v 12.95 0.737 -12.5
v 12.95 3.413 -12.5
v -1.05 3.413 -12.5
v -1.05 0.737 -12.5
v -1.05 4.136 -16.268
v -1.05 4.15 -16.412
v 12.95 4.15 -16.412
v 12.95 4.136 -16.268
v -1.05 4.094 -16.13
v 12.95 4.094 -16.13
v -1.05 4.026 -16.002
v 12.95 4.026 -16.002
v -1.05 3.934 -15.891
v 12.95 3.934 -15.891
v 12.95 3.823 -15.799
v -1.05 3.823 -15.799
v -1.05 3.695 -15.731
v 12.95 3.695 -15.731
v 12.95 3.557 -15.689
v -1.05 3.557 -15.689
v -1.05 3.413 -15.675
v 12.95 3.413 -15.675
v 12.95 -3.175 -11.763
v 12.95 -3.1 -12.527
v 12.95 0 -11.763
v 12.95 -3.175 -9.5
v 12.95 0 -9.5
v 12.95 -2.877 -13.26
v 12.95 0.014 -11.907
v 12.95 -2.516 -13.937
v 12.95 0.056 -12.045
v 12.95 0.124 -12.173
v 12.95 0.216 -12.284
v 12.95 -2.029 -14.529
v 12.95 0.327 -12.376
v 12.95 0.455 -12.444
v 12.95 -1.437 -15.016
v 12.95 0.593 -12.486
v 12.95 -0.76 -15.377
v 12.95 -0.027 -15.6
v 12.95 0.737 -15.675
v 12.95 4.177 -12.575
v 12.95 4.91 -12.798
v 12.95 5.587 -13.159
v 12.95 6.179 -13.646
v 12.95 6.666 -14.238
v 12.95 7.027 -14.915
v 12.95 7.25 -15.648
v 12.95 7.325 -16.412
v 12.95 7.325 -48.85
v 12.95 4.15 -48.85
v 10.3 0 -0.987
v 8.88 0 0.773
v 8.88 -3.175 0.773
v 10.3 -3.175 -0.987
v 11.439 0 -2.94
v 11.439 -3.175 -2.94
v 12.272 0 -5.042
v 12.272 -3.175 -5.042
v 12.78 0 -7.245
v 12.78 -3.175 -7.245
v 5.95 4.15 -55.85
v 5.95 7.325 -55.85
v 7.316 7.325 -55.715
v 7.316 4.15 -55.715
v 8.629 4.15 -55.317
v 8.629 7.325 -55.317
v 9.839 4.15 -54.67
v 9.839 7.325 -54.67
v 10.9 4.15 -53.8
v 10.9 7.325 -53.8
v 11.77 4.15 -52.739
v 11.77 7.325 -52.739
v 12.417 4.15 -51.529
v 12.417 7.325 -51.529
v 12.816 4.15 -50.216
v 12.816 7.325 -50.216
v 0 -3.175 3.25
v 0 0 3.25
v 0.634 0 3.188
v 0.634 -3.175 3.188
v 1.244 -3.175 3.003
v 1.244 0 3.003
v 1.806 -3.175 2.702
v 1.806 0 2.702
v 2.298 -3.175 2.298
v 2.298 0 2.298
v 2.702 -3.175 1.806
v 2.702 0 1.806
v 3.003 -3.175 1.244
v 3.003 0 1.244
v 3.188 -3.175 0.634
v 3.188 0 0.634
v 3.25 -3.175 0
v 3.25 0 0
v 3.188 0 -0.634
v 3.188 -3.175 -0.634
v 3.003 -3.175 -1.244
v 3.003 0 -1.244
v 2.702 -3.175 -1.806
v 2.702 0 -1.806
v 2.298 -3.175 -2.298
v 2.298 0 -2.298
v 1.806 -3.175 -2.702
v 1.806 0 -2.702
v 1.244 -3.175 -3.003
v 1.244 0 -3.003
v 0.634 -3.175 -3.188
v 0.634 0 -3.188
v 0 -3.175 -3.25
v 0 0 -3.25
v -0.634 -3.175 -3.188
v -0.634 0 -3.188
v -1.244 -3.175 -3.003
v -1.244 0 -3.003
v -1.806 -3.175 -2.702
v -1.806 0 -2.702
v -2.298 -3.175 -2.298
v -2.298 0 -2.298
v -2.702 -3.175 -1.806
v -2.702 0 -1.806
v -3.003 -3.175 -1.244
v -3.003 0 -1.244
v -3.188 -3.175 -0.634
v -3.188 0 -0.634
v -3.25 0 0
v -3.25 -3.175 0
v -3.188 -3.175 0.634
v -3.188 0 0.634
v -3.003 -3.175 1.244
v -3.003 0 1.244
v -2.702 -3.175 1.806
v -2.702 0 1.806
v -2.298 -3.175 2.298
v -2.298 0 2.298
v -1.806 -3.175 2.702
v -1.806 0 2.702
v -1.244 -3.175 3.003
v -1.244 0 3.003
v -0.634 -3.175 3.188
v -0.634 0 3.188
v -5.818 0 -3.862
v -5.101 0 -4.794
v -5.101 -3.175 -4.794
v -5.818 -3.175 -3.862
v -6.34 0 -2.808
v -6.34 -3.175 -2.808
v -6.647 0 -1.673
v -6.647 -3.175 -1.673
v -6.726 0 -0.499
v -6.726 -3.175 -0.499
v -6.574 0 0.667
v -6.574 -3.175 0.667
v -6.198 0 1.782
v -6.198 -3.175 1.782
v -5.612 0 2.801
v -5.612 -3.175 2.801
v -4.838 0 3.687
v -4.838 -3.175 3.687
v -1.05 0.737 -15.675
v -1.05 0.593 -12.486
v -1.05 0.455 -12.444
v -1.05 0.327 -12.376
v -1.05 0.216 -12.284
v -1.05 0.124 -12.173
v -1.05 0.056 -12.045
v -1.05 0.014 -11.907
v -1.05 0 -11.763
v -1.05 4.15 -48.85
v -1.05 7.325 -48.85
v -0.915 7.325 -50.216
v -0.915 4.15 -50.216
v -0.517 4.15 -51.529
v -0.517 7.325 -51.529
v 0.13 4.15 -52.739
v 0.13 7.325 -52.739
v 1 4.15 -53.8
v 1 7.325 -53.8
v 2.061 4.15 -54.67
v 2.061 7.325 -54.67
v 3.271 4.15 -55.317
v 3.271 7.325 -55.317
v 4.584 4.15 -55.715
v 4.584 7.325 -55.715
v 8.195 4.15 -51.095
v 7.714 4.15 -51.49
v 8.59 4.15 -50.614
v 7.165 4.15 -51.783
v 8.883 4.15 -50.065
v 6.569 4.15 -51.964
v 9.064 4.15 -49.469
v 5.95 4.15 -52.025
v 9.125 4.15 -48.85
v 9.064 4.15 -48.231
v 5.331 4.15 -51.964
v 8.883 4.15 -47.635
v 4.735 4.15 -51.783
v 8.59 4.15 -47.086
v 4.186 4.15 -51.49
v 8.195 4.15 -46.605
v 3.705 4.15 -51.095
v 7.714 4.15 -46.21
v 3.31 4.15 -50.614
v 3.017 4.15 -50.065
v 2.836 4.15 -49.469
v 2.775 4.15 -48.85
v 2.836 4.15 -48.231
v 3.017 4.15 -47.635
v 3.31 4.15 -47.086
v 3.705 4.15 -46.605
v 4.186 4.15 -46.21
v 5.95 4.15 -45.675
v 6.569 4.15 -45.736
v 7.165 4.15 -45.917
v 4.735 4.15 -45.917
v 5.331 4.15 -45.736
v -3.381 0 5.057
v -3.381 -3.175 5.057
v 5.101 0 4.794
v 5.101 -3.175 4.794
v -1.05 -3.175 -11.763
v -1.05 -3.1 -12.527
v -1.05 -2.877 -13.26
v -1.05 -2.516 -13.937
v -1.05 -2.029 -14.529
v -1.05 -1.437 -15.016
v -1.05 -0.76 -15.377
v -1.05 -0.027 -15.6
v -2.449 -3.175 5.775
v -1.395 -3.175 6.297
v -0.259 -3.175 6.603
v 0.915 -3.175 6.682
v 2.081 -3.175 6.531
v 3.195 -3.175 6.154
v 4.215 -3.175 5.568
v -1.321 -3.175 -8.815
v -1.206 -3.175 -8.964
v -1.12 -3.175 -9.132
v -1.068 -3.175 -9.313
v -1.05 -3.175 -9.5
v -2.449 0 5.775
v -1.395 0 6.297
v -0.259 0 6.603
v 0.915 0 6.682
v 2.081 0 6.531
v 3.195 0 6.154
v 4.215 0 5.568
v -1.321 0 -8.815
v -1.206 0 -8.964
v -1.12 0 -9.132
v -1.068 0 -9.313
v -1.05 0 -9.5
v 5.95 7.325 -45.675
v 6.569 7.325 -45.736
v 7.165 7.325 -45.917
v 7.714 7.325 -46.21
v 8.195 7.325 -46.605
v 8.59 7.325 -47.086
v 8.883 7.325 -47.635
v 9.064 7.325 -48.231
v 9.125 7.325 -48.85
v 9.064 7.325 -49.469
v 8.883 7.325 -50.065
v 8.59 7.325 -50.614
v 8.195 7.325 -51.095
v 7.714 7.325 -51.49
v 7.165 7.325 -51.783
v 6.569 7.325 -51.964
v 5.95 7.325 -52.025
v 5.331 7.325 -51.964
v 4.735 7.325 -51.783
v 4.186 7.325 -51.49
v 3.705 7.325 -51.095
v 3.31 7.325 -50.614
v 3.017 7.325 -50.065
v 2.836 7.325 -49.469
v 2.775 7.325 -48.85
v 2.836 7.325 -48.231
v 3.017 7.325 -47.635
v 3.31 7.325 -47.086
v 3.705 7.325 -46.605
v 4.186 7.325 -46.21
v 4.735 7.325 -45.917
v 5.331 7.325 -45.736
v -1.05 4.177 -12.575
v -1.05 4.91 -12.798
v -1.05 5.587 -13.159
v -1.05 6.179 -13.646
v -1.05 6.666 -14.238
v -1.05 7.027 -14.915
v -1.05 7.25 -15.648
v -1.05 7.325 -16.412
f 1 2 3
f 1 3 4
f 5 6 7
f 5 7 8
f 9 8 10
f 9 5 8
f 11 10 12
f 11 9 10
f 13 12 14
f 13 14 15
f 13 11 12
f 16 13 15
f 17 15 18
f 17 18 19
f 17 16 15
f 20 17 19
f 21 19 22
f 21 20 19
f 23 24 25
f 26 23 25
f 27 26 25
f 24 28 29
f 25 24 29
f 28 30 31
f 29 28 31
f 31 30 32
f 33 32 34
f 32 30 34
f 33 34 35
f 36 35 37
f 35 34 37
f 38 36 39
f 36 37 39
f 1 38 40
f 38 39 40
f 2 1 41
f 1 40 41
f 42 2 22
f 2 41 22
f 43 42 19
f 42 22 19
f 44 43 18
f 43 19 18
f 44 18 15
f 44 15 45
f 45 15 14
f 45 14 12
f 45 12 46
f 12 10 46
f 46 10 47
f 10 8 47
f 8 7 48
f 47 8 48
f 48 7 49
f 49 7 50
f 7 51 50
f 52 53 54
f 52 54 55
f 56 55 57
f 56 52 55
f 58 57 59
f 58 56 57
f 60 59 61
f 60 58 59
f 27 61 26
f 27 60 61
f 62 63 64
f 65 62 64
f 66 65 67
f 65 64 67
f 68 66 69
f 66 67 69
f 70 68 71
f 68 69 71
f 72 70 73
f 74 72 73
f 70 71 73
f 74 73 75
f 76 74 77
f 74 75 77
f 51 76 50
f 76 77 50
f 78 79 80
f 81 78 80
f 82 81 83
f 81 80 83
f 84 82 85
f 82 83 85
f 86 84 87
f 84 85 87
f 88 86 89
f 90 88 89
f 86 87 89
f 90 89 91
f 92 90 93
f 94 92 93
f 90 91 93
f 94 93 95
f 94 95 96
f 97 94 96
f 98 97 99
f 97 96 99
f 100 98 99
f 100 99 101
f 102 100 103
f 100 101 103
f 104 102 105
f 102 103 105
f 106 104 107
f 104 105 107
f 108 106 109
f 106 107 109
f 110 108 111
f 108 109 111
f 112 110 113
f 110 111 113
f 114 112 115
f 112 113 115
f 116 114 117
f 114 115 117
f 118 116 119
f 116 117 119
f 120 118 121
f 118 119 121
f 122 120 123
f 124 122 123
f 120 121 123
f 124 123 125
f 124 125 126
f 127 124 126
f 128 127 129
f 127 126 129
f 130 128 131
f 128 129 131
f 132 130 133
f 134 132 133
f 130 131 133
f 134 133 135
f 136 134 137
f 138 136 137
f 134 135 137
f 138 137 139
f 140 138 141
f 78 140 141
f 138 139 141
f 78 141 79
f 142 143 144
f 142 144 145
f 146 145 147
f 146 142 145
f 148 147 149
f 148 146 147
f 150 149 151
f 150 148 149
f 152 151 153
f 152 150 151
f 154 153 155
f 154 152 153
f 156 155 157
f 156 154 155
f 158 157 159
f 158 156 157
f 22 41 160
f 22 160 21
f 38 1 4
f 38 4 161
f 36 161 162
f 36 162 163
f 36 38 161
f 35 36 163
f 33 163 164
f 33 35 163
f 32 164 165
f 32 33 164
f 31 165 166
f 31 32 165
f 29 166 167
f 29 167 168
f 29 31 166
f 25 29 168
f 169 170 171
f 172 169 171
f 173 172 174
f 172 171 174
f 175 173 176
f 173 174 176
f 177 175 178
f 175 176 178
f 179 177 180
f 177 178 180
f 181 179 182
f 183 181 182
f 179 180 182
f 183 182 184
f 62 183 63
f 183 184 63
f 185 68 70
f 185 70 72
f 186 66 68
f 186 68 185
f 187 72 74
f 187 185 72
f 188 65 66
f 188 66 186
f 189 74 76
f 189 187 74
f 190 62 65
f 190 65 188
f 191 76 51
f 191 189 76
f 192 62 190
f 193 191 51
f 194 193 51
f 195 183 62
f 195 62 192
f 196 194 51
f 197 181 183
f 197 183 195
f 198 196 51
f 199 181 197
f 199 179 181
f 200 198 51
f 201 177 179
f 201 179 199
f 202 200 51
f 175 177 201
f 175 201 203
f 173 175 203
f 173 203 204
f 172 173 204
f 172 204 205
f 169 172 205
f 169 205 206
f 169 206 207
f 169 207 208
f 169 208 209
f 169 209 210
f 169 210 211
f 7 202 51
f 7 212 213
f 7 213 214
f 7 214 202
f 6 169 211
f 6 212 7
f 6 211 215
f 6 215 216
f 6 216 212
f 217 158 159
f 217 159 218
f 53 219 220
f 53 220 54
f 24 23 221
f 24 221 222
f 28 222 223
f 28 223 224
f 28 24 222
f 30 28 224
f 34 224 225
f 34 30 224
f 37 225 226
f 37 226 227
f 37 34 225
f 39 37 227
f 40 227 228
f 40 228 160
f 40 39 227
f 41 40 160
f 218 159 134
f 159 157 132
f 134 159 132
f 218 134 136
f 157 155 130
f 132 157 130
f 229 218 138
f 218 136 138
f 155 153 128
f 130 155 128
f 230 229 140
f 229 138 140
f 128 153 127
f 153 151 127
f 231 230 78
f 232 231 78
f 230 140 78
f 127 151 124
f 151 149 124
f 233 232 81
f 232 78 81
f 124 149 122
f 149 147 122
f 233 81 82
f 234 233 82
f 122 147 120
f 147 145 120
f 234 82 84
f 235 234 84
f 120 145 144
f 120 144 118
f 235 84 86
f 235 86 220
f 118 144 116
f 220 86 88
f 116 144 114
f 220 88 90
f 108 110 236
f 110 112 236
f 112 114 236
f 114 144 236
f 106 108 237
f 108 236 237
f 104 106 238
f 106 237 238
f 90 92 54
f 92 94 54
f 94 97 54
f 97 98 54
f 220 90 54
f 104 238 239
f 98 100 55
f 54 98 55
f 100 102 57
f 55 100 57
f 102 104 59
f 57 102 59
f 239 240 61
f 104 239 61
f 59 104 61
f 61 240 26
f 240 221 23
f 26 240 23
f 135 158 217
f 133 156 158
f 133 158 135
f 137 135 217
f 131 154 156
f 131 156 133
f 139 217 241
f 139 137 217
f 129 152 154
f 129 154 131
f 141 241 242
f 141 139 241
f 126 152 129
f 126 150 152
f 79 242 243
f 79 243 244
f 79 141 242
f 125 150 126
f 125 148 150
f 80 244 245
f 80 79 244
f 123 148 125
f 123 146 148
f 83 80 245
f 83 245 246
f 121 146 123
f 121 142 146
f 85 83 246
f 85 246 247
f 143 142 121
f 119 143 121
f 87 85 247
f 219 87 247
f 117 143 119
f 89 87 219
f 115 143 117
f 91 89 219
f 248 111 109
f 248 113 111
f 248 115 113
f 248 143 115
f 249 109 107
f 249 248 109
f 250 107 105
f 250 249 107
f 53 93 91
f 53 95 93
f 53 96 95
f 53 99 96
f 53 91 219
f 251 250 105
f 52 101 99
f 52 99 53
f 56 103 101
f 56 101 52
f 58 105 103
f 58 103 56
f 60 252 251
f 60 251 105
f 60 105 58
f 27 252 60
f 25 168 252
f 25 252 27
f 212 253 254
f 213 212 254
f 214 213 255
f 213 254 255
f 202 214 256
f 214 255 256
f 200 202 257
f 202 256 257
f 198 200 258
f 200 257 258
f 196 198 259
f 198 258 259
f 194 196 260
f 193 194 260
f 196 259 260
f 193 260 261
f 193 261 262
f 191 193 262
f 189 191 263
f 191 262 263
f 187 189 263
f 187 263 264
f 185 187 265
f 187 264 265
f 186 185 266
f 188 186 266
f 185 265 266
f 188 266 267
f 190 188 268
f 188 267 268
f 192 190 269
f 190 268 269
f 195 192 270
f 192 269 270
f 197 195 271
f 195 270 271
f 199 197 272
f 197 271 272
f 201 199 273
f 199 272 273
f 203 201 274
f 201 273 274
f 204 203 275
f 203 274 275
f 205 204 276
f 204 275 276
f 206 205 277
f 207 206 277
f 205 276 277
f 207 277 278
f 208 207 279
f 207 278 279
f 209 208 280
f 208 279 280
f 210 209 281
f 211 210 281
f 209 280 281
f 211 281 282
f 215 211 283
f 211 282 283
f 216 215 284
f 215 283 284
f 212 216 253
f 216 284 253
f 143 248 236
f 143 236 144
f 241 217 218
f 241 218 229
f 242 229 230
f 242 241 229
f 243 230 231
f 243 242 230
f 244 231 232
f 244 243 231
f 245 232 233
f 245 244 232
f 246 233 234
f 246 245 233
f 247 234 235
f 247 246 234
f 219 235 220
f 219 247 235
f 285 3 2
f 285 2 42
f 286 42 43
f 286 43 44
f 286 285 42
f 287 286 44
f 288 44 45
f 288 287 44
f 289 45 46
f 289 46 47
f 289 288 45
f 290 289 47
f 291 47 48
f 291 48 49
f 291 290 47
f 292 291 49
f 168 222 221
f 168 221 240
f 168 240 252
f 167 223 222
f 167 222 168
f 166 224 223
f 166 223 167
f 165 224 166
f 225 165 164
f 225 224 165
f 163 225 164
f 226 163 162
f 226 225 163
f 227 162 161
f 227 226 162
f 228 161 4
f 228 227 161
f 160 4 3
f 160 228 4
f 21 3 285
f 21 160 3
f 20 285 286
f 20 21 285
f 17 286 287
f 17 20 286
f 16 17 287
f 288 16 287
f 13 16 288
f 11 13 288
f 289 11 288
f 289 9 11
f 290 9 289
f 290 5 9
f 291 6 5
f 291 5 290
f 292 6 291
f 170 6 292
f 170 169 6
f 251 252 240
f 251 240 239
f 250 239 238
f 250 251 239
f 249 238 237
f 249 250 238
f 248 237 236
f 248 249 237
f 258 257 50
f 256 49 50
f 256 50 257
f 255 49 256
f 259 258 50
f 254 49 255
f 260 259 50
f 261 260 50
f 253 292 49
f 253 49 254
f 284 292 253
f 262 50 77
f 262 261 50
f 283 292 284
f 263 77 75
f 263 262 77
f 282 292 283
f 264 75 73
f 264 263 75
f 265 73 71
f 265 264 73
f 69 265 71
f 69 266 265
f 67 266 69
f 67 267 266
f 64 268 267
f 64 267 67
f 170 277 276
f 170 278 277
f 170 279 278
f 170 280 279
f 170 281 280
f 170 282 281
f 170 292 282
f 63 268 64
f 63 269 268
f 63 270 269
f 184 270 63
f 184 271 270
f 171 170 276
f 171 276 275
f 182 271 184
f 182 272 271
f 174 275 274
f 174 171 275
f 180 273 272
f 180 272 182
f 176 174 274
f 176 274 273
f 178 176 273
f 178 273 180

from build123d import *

# Parameters (mm, degrees)
SKETCH1_R                    = 3.25
BASE_FLANGE1_DEPTH           = 3.175
EDGE_FLANGE1_STRIP_W         = 14.1732
EDGE_FLANGE1_STRIP_H         = 3.175
EDGE_FLANGE1_STRIP_CUT_DEPTH = 14
EDGE_FLANGE1_DEPTH           = 14
EDGE_FLANGE2_STRIP_W         = 14.1732
EDGE_FLANGE2_STRIP_H         = 3.175
EDGE_FLANGE2_STRIP_CUT_DEPTH = 14
EDGE_FLANGE2_DEPTH           = 14
SKETCH17_R                   = 3.175
CUT_EXTRUDE1_DEPTH           = 3.175


# Sheet-metal steps are written as plain solids
with BuildPart() as part:
    # Sketch1 → Base-Flange1 (new body)
    with BuildSketch(Plane(origin=(0, 0, 0), x_dir=(1, 0, 0), z_dir=(0, 1, 0))):
        with BuildLine():
            Line((12.950003607, 12.5), (-1.049996393, 12.5))
            Line((-1.049996393, 12.5), (-1.049996393, 9.5))
            ThreePointArc((-1.049996393, 9.5), (-1.120300603, 9.131671699), (-1.321327868, 8.815133458))
            Line((-1.321327868, 8.815133458), (-5.100679674, 4.794065797))
            ThreePointArc((-5.100679674, 4.794065797), (-6.725789914, 0.499030469), (-4.837867779, -3.687144607))
            Line((-4.837867779, -3.687144607), (-3.380530729, -5.056877692))
            ThreePointArc((-3.380530729, -5.056877692), (0.914504598, -6.681987931), (5.100679674, -4.794065797))
            Line((5.100679674, -4.794065797), (8.88003148, -0.772998135))
            ThreePointArc((8.88003148, -0.772998135), (11.895440461, 3.97507548), (12.950003607, 9.5))
            Line((12.950003607, 9.5), (12.950003607, 12.5))
        make_face()
        with Locations(Location((0, 0, 0), (0, 0, 270))):
            Circle(SKETCH1_R, mode=Mode.SUBTRACT)
    extrude(amount=-BASE_FLANGE1_DEPTH)

    # Edge-Flange1 strip (across the edge) → Edge-Flange1 strip cut (cut)
    with BuildSketch(Plane(origin=(12.950003607, 0, -12.5), x_dir=(0, 0, 1), z_dir=(-1, 0, 0))):
        with Locations((-6.35, -1.5875)):
            Rectangle(EDGE_FLANGE1_STRIP_W, EDGE_FLANGE1_STRIP_H)
    extrude(amount=EDGE_FLANGE1_STRIP_CUT_DEPTH, mode=Mode.SUBTRACT)

    # Edge-Flange1 section (across the edge) → Edge-Flange1 (add)
    with BuildSketch(Plane(origin=(12.950003607, 0, -12.5), x_dir=(0, 0, 1), z_dir=(-1, 0, 0))):
        with BuildLine():
            Line((-3.175, 0.7366), (-3.175, 7.324994814))
            Line((-3.175, 7.324994814), (0, 7.324994814))
            Line((0, 7.324994814), (0, 0.7366))
            ThreePointArc((0, 0.7366), (0.215745145, 0.215745145), (0.7366, 0))
            Line((0.7366, 0), (0.7366, -3.175))
            ThreePointArc((0.7366, -3.175), (-2.029318885, -2.029318885), (-3.175, 0.7366))
        make_face()
    extrude(amount=EDGE_FLANGE1_DEPTH)

    # Edge-Flange2 strip (across the edge) → Edge-Flange2 strip cut (cut)
    with BuildSketch(Plane(origin=(-1.049996393, 7.324994814, -15.675), x_dir=(0, -1, 0), z_dir=(1, 0, 0))):
        with Locations((-3.175, -1.5875)):
            Rectangle(EDGE_FLANGE2_STRIP_W, EDGE_FLANGE2_STRIP_H)
    extrude(amount=EDGE_FLANGE2_STRIP_CUT_DEPTH, mode=Mode.SUBTRACT)

    # Edge-Flange2 section (across the edge) → Edge-Flange2 (add)
    with BuildSketch(Plane(origin=(-1.049996393, 7.324994814, -15.675), x_dir=(0, -1, 0), z_dir=(1, 0, 0))):
        with BuildLine():
            Line((0, 0.7366), (0, 40.174998631))
            Line((0, 40.174998631), (3.175, 40.174998631))
            Line((3.175, 40.174998631), (3.175, 0.7366))
            ThreePointArc((3.175, 0.7366), (3.390745145, 0.215745145), (3.9116, 0))
            Line((3.9116, 0), (3.9116, -3.175))
            ThreePointArc((3.9116, -3.175), (1.145681115, -2.029318885), (0, 0.7366))
        make_face()
    extrude(amount=EDGE_FLANGE2_DEPTH)

    # Sketch17 → Cut-Extrude1 (cut)
    with BuildSketch(Plane(origin=(0, 7.324994814, 0), x_dir=(1, 0, 0), z_dir=(0, 1, 0))):
        with BuildLine():
            ThreePointArc((-1.049996393, 48.849998631), (1.000256139, 53.7997461), (5.950003607, 55.849998631))
            Line((5.950003607, 55.849998631), (-1.049996393, 55.849998631))
            Line((-1.049996393, 55.849998631), (-1.049996393, 48.849998631))
        make_face()
        with BuildLine():
            ThreePointArc((5.950003607, 55.849998631), (10.899751075, 53.7997461), (12.950003607, 48.849998631))
            Line((12.950003607, 48.849998631), (12.950003607, 55.849998631))
            Line((12.950003607, 55.849998631), (5.950003607, 55.849998631))
        make_face()
        with Locations(Location((5.950003607, 48.849998631, 0), (0, 0, 270))):
            Circle(SKETCH17_R)
    extrude(amount=-CUT_EXTRUDE1_DEPTH, mode=Mode.SUBTRACT)


solid = part.part
